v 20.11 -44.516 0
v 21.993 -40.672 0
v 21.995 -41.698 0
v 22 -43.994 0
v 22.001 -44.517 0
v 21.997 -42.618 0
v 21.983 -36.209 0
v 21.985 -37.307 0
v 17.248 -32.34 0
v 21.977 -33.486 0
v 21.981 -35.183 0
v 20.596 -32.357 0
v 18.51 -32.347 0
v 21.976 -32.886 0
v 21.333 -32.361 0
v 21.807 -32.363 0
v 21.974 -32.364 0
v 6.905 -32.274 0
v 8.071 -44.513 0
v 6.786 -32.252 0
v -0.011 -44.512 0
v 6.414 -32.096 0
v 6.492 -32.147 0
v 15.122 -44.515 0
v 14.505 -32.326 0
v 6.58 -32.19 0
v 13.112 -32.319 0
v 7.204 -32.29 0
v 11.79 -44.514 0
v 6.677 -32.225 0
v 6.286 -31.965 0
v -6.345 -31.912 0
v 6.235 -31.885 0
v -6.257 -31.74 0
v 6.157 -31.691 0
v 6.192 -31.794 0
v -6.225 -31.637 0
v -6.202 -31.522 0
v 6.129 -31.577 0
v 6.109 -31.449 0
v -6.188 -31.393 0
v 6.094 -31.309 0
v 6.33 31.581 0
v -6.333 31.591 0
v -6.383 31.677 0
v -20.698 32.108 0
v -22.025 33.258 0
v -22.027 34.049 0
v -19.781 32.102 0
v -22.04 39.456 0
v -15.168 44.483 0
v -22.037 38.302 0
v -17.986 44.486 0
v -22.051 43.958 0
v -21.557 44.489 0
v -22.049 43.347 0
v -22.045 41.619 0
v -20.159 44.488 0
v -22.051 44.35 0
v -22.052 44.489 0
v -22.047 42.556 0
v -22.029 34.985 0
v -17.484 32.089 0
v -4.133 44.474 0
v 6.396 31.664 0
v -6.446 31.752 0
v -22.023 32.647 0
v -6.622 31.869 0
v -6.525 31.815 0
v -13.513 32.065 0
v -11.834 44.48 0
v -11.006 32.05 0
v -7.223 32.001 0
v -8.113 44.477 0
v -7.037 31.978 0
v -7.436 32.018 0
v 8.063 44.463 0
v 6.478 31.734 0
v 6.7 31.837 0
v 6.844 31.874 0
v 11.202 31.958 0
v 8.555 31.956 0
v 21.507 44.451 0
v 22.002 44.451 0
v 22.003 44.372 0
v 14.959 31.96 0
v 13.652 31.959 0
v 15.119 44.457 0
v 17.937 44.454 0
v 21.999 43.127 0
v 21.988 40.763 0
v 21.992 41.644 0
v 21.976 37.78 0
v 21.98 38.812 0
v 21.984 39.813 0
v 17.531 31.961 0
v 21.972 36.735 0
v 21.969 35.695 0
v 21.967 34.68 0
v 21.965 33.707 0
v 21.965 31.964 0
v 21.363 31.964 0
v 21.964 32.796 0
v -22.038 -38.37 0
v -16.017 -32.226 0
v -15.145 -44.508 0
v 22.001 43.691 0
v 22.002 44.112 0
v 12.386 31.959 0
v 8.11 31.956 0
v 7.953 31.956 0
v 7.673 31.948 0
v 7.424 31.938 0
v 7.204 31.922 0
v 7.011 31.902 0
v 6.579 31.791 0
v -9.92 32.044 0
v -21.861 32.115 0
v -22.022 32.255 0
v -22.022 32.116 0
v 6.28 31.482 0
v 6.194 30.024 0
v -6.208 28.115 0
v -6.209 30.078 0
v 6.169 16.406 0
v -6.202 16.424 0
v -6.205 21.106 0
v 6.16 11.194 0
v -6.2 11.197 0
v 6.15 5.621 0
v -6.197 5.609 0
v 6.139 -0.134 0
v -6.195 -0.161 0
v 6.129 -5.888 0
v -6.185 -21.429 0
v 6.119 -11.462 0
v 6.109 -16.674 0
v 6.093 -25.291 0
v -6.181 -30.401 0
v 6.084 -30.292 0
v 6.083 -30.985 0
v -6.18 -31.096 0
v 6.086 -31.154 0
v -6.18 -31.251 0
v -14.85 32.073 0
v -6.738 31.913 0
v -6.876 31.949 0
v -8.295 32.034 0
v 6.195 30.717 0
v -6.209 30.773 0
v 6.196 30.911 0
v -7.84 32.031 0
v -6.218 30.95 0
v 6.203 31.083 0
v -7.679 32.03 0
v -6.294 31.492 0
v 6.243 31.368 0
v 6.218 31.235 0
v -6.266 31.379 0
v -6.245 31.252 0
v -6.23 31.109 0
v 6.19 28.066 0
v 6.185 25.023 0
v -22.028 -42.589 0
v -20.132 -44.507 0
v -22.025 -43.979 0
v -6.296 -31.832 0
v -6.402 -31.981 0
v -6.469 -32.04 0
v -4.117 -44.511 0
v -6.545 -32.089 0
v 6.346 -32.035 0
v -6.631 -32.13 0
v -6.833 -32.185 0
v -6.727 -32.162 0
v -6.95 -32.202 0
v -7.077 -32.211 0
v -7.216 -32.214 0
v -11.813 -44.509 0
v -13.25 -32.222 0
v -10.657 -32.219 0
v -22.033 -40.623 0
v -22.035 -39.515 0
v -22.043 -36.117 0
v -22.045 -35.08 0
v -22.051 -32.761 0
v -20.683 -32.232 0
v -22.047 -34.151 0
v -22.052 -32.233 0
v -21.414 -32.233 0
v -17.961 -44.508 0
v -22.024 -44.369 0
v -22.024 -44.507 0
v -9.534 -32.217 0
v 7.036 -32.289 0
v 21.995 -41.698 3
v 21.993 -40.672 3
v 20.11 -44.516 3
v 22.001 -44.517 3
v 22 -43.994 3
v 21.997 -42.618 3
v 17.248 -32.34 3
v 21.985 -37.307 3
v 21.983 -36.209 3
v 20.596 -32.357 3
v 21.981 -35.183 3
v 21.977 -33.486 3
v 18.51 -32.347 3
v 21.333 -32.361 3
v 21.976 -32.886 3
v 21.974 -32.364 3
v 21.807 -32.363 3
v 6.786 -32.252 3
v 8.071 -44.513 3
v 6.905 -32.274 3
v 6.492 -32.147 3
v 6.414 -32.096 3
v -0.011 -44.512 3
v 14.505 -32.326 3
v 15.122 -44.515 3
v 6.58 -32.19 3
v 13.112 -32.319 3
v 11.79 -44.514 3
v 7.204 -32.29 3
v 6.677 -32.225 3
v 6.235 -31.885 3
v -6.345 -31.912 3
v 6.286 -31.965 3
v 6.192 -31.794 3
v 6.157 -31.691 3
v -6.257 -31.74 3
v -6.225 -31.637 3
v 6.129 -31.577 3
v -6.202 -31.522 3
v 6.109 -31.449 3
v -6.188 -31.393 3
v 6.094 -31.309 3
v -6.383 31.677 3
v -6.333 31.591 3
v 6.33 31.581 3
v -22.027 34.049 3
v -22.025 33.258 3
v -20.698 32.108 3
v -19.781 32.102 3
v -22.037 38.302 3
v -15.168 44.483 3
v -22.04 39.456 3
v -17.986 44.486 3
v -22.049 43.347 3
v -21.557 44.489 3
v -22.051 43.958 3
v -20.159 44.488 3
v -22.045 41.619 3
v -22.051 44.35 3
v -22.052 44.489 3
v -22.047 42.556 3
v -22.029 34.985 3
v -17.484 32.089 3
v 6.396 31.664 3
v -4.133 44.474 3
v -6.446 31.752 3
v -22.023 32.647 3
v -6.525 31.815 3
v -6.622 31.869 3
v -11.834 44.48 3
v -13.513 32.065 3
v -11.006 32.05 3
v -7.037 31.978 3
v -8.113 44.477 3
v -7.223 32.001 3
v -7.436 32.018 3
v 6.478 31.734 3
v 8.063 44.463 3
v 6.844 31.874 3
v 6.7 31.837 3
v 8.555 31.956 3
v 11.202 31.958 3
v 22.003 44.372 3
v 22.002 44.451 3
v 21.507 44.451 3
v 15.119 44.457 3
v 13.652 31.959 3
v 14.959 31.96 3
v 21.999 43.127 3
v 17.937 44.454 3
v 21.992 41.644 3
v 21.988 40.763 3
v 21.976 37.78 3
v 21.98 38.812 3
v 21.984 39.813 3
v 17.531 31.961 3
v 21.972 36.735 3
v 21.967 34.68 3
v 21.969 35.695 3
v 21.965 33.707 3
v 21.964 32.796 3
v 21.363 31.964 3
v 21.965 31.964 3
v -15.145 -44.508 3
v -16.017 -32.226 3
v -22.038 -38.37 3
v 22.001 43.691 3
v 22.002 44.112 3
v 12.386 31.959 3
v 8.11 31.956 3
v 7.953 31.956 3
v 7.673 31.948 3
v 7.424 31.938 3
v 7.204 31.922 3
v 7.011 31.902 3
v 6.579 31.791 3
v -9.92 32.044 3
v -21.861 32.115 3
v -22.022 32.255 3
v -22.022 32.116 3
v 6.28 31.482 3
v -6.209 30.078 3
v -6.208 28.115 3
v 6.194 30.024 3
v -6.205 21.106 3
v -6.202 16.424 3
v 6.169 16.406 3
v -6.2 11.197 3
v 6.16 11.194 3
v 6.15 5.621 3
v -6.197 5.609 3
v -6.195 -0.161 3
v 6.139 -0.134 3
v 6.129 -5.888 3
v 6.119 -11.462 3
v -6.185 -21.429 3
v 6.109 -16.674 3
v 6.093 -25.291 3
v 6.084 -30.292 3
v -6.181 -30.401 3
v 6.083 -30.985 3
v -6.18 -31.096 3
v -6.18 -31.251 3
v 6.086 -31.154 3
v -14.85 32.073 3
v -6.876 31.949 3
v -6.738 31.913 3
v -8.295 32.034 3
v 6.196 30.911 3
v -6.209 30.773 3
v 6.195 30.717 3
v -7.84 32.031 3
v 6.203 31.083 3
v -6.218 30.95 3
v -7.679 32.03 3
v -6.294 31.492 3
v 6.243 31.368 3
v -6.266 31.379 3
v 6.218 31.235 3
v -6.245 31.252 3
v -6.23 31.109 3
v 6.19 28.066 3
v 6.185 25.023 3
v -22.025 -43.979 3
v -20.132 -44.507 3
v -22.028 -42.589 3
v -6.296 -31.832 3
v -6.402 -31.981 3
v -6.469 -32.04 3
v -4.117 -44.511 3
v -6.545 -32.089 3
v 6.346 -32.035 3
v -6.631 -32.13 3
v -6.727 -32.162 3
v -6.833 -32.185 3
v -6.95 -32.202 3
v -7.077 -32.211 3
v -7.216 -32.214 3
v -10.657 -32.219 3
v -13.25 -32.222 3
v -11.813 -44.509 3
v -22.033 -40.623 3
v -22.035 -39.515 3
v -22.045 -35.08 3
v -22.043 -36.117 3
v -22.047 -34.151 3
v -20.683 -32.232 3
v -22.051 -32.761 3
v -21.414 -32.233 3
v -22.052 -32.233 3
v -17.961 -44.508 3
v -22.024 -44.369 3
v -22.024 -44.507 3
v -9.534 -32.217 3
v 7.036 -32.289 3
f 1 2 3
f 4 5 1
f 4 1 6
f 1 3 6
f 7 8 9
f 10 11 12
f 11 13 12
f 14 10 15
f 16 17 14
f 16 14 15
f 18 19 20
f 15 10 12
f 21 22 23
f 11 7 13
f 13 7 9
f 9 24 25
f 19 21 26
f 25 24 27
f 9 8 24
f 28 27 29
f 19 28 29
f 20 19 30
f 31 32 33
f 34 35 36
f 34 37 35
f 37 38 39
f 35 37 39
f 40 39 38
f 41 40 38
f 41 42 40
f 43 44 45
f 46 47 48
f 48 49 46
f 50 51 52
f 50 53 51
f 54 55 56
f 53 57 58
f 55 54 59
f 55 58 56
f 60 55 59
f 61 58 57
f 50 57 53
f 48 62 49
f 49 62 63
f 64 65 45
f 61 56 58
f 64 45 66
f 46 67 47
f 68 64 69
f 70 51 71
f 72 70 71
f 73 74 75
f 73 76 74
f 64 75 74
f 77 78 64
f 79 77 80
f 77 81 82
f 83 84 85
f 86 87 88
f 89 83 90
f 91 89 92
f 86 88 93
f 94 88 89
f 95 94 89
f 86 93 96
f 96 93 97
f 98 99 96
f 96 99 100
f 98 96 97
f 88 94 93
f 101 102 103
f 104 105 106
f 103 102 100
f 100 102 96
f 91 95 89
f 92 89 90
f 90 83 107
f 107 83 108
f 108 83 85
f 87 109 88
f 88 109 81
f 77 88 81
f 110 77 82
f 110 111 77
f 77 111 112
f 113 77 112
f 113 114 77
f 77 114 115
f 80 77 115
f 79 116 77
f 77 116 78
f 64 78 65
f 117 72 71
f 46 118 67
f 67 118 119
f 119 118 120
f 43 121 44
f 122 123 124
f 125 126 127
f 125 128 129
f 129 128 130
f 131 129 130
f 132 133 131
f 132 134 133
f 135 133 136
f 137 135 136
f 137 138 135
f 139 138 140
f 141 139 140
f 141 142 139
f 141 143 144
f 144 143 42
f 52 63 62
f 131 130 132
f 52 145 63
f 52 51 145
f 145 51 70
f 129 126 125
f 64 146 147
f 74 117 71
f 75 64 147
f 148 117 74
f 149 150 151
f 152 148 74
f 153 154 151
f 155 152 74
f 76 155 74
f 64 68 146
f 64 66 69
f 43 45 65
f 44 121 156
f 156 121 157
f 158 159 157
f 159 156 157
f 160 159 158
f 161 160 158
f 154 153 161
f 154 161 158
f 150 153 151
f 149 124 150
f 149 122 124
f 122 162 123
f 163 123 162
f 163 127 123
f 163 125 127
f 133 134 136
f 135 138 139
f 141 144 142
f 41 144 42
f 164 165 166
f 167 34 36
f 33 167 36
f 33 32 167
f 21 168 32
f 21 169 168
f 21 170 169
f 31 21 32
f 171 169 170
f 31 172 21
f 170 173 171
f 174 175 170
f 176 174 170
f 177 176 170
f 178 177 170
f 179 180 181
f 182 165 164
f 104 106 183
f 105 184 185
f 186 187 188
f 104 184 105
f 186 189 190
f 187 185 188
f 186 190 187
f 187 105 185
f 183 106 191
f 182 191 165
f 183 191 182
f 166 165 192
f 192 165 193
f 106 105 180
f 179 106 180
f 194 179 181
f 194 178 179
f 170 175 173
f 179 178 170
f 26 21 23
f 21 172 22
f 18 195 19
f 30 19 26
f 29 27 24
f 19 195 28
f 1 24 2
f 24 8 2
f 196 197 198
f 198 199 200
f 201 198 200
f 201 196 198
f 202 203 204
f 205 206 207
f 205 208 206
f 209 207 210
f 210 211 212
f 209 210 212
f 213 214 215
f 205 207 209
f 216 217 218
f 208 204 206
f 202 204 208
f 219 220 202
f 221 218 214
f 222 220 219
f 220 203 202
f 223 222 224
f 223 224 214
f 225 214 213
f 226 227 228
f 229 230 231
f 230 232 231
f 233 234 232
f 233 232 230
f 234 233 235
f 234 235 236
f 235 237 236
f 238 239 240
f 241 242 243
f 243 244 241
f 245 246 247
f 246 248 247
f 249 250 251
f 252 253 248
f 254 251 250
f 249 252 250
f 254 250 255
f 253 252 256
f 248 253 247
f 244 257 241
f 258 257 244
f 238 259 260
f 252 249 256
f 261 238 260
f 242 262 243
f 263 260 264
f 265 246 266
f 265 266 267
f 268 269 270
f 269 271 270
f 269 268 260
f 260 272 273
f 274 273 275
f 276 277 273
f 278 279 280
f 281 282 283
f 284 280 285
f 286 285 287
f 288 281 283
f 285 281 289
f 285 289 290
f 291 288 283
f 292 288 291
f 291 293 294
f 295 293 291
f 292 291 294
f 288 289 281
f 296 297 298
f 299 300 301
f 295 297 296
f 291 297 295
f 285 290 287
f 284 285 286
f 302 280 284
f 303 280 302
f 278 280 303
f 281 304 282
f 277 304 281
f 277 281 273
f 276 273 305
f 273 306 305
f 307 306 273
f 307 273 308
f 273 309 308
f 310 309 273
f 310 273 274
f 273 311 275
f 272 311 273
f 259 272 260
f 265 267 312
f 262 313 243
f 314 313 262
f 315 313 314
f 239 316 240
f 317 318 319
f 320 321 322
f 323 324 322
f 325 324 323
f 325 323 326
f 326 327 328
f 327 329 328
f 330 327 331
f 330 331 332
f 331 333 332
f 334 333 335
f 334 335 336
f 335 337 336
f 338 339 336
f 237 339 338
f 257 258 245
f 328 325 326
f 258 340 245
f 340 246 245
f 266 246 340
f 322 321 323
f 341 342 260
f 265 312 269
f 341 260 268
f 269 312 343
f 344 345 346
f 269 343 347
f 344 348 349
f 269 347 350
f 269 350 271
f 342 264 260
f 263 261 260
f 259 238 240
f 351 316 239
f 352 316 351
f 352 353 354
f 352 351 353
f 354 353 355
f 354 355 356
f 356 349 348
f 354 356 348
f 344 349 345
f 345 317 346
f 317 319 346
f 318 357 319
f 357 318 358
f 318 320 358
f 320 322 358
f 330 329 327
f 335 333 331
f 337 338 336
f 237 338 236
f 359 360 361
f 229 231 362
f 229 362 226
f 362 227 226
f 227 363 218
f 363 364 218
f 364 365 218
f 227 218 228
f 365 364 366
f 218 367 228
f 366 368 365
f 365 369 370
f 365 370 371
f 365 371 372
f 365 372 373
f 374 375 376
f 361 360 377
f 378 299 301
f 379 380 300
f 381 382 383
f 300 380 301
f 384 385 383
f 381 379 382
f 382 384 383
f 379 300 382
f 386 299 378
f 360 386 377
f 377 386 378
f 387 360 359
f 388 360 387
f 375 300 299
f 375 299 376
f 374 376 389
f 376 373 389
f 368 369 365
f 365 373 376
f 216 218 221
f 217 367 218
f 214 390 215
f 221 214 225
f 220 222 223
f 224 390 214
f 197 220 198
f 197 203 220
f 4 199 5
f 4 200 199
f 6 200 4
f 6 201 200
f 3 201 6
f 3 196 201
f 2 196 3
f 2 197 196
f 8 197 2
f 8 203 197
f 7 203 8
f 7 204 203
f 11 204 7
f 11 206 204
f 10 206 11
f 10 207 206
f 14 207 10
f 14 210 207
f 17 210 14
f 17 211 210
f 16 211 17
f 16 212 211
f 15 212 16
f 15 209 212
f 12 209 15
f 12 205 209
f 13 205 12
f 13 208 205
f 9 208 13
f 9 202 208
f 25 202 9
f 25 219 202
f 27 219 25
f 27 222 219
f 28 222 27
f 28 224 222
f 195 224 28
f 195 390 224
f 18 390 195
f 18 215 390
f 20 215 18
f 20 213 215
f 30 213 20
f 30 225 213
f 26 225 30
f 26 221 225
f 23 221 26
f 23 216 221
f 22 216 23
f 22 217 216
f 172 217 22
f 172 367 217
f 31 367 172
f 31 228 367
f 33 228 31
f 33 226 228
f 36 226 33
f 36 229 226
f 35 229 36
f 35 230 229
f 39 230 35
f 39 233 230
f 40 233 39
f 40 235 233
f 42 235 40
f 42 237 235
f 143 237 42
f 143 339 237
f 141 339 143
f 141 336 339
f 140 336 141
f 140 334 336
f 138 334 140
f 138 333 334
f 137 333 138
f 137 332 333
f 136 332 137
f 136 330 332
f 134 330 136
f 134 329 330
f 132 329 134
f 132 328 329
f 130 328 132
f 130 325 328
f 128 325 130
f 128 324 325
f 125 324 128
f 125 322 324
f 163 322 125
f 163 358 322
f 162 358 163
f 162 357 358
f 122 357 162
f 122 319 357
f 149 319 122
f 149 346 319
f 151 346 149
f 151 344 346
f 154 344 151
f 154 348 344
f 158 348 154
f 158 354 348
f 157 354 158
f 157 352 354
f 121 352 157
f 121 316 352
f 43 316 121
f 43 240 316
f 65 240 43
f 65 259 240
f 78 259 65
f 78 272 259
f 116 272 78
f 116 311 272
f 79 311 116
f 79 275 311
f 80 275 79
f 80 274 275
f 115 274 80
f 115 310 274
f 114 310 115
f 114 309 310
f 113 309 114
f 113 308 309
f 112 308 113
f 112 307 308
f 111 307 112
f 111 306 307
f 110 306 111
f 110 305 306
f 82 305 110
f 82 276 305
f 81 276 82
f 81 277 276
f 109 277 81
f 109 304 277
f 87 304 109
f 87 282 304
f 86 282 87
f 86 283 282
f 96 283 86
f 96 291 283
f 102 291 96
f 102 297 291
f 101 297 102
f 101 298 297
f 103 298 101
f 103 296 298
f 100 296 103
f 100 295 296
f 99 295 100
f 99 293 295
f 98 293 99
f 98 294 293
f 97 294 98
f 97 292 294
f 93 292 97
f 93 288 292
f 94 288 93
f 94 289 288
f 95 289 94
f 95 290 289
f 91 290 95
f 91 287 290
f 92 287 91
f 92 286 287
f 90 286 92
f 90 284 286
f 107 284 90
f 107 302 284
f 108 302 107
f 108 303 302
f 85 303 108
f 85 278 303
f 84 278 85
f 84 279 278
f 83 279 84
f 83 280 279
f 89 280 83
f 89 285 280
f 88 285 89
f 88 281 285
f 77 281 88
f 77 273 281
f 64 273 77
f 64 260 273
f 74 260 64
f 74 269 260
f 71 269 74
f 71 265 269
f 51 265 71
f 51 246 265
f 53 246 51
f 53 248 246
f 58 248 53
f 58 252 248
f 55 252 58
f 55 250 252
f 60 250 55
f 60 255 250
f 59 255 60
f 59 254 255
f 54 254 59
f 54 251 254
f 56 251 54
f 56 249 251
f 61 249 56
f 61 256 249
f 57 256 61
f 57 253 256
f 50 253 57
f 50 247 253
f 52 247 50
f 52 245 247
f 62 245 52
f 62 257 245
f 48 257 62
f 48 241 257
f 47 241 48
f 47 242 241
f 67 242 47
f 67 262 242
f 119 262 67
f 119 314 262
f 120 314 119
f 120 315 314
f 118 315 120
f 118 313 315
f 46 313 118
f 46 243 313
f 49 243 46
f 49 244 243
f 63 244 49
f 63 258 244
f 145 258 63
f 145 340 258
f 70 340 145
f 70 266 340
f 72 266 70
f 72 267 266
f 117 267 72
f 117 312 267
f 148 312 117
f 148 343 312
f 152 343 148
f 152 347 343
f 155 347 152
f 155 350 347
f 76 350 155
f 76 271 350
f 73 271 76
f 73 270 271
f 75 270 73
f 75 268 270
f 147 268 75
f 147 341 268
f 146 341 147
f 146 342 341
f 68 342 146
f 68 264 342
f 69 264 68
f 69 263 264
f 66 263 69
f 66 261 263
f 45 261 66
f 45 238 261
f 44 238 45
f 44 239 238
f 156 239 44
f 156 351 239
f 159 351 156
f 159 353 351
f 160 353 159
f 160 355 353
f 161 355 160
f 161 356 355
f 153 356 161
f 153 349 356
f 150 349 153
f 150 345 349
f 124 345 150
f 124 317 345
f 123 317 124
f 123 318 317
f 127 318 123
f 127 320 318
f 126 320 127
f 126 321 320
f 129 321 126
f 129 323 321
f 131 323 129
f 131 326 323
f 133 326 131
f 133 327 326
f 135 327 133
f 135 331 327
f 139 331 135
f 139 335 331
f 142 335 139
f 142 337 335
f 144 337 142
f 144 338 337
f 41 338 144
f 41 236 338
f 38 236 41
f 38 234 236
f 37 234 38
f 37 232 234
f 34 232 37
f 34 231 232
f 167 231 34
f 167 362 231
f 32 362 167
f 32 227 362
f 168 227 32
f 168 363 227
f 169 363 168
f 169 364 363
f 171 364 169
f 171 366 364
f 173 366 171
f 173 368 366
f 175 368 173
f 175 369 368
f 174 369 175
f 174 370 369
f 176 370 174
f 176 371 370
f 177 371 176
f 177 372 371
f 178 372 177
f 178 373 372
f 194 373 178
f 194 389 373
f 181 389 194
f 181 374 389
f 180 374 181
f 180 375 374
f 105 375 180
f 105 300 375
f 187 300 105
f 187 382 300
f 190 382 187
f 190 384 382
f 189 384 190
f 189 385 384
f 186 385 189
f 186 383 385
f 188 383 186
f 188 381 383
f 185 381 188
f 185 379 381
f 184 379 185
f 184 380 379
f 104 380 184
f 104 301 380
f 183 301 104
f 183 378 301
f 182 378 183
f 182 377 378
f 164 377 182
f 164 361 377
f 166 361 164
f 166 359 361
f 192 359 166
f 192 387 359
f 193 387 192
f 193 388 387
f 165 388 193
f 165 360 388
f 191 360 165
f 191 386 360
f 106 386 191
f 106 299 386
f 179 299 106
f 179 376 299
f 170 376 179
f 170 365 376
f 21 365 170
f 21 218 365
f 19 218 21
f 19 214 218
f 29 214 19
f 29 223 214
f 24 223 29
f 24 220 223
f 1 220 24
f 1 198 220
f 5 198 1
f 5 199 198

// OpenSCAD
// Generated from 交通部公路局（原交通部公路總局）「新式號牌使用之英文字、數字字體」author trace
fudge = 0.1;

module glyph_2012_I(h = 3) {
  difference() {
    linear_extrude(height = h)
      polygon(points = [[-22.0519, 44.4893], [-22.0515, 44.3503], [-22.0506, 43.9576], [-22.0491, 43.3474], [-22.0472, 42.5559], [-22.0449, 41.6194], [-22.0424, 40.5742], [-22.0397, 39.4565], [-22.037, 38.3025], [-22.0342, 37.1485], [-22.0315, 36.0308], [-22.029, 34.9855], [-22.0267, 34.0491], [-22.0248, 33.2576], [-22.0234, 32.6474], [-22.0224, 32.2547], [-22.0221, 32.1157], [-21.861, 32.1147], [-21.4058, 32.112], [-20.6984, 32.1078], [-19.781, 32.1023], [-18.6954, 32.0959], [-17.4838, 32.0887], [-16.1882, 32.081], [-14.8505, 32.073], [-13.5129, 32.065], [-12.2172, 32.0573], [-11.0056, 32.0501], [-9.9201, 32.0436], [-9.0026, 32.0382], [-8.2953, 32.034], [-7.8401, 32.0312], [-7.679, 32.0303], [-7.4363, 32.0179], [-7.2228, 32.0009], [-7.0366, 31.9784], [-6.8758, 31.9494], [-6.7383, 31.9132], [-6.6222, 31.8688], [-6.5255, 31.8152], [-6.4464, 31.7516], [-6.3828, 31.6771], [-6.3329, 31.5908], [-6.2945, 31.4917], [-6.2659, 31.3789], [-6.245, 31.2516], [-6.2298, 31.1088], [-6.2185, 30.9496], [-6.2091, 30.7732], [-6.2088, 30.0784], [-6.2078, 28.1148], [-6.2064, 25.0636], [-6.2046, 21.1062], [-6.2024, 16.4238], [-6.2, 11.1975], [-6.1974, 5.6088], [-6.1948, -0.1612], [-6.1921, -5.9312], [-6.1895, -11.5199], [-6.1871, -16.7461], [-6.1849, -21.4286], [-6.1831, -25.386], [-6.1817, -28.4371], [-6.1808, -30.4008], [-6.1805, -31.0956], [-6.1803, -31.2515], [-6.1875, -31.3934], [-6.2025, -31.5218], [-6.2254, -31.6373], [-6.2566, -31.7404], [-6.2962, -31.8317], [-6.3446, -31.9117], [-6.4019, -31.9809], [-6.4686, -32.04], [-6.5447, -32.0894], [-6.6306, -32.1298], [-6.7266, -32.1616], [-6.8328, -32.1854], [-6.9497, -32.2018], [-7.0773, -32.2113], [-7.216, -32.2145], [-7.3826, -32.2147], [-7.8535, -32.2153], [-8.5851, -32.2162], [-9.5341, -32.2174], [-10.6569, -32.2189], [-11.9101, -32.2205], [-13.2503, -32.2222], [-14.6339, -32.224], [-16.0175, -32.2258], [-17.3577, -32.2275], [-18.6109, -32.2291], [-19.7337, -32.2305], [-20.6827, -32.2317], [-21.4144, -32.2327], [-21.8852, -32.2333], [-22.0518, -32.2335], [-22.0515, -32.3713], [-22.0507, -32.7608], [-22.0493, -33.3661], [-22.0475, -34.1512], [-22.0454, -35.08], [-22.043, -36.1168], [-22.0405, -37.2255], [-22.0379, -38.3701], [-22.0354, -39.5147], [-22.0328, -40.6234], [-22.0305, -41.6601], [-22.0284, -42.589], [-22.0266, -43.374], [-22.0252, -43.9793], [-22.0244, -44.3688], [-22.024, -44.5067], [-21.5296, -44.5068], [-20.1323, -44.5071], [-17.9611, -44.5076], [-15.1451, -44.5082], [-11.813, -44.509], [-8.0941, -44.5098], [-4.1172, -44.5107], [-0.0113, -44.5117], [4.0946, -44.5126], [8.0715, -44.5135], [11.7905, -44.5144], [15.1225, -44.5151], [17.9386, -44.5158], [20.1098, -44.5163], [21.5071, -44.5166], [22.0015, -44.5167], [22.0012, -44.3802], [22.0003, -43.9945], [21.999, -43.3952], [21.9973, -42.6179], [21.9952, -41.6981], [21.9929, -40.6716], [21.9905, -39.5738], [21.988, -38.4404], [21.9855, -37.3071], [21.983, -36.2093], [21.9807, -35.1828], [21.9787, -34.263], [21.977, -33.4857], [21.9756, -32.8864], [21.9748, -32.5007], [21.9745, -32.3642], [21.8067, -32.3634], [21.3326, -32.361], [20.5959, -32.3572], [19.6404, -32.3524], [18.5098, -32.3467], [17.2479, -32.3403], [15.8985, -32.3335], [14.5053, -32.3265], [13.1121, -32.3194], [11.7627, -32.3126], [10.5008, -32.3062], [9.3703, -32.3005], [8.4147, -32.2957], [7.678, -32.292], [7.2039, -32.2896], [7.0361, -32.2887], [6.9053, -32.2736], [6.7859, -32.2525], [6.6774, -32.2247], [6.5796, -32.1898], [6.492, -32.147], [6.4142, -32.0957], [6.3457, -32.0354], [6.2862, -31.9655], [6.2353, -31.8853], [6.1924, -31.7942], [6.1573, -31.6915], [6.1295, -31.5768], [6.1086, -31.4494], [6.0942, -31.3087], [6.0859, -31.154], [6.0832, -30.9848], [6.0845, -30.2918], [6.088, -28.3335], [6.0935, -25.2906], [6.1007, -21.3438], [6.1092, -16.674], [6.1186, -11.4619], [6.1287, -5.8882], [6.1392, -0.1338], [6.1496, 5.6207], [6.1598, 11.1943], [6.1692, 16.4065], [6.1777, 21.0763], [6.1849, 25.0231], [6.1904, 28.066], [6.1939, 30.0243], [6.1952, 30.7172], [6.1957, 30.9111], [6.2027, 31.0832], [6.2179, 31.2349], [6.2431, 31.3676], [6.28, 31.4824], [6.3303, 31.5809], [6.3958, 31.6643], [6.4782, 31.7339], [6.5792, 31.7911], [6.7005, 31.8372], [6.8439, 31.8736], [7.0111, 31.9016], [7.2039, 31.9225], [7.4239, 31.9377], [7.6729, 31.9484], [7.9526, 31.9561], [8.11, 31.9561], [8.5547, 31.9564], [9.2457, 31.9568], [10.142, 31.9573], [11.2025, 31.9579], [12.3862, 31.9586], [13.6519, 31.9593], [14.9588, 31.9601], [16.2656, 31.9608], [17.5313, 31.9615], [18.715, 31.9622], [19.7755, 31.9628], [20.6718, 31.9633], [21.3628, 31.9637], [21.8076, 31.964], [21.9649, 31.9641], [21.9644, 32.7958], [21.9651, 33.7073], [21.9667, 34.6801], [21.9692, 35.6955], [21.9723, 36.7351], [21.9759, 37.7802], [21.9799, 38.8122], [21.984, 39.8127], [21.988, 40.763], [21.9919, 41.6445], [21.9955, 42.4388], [21.9986, 43.1272], [22.0009, 43.6912], [22.0025, 44.1122], [22.003, 44.3716], [22.0023, 44.4509], [21.5075, 44.4513], [20.1093, 44.4525], [17.9368, 44.4544], [15.1188, 44.4569], [11.7847, 44.4598], [8.0633, 44.463], [4.0838, 44.4665], [-0.0248, 44.4701], [-4.1333, 44.4737], [-8.1128, 44.4771], [-11.8342, 44.4804], [-15.1684, 44.4833], [-17.9863, 44.4858], [-20.1589, 44.4876], [-21.5571, 44.4889]]);
  }
}

glyph_2012_I();
